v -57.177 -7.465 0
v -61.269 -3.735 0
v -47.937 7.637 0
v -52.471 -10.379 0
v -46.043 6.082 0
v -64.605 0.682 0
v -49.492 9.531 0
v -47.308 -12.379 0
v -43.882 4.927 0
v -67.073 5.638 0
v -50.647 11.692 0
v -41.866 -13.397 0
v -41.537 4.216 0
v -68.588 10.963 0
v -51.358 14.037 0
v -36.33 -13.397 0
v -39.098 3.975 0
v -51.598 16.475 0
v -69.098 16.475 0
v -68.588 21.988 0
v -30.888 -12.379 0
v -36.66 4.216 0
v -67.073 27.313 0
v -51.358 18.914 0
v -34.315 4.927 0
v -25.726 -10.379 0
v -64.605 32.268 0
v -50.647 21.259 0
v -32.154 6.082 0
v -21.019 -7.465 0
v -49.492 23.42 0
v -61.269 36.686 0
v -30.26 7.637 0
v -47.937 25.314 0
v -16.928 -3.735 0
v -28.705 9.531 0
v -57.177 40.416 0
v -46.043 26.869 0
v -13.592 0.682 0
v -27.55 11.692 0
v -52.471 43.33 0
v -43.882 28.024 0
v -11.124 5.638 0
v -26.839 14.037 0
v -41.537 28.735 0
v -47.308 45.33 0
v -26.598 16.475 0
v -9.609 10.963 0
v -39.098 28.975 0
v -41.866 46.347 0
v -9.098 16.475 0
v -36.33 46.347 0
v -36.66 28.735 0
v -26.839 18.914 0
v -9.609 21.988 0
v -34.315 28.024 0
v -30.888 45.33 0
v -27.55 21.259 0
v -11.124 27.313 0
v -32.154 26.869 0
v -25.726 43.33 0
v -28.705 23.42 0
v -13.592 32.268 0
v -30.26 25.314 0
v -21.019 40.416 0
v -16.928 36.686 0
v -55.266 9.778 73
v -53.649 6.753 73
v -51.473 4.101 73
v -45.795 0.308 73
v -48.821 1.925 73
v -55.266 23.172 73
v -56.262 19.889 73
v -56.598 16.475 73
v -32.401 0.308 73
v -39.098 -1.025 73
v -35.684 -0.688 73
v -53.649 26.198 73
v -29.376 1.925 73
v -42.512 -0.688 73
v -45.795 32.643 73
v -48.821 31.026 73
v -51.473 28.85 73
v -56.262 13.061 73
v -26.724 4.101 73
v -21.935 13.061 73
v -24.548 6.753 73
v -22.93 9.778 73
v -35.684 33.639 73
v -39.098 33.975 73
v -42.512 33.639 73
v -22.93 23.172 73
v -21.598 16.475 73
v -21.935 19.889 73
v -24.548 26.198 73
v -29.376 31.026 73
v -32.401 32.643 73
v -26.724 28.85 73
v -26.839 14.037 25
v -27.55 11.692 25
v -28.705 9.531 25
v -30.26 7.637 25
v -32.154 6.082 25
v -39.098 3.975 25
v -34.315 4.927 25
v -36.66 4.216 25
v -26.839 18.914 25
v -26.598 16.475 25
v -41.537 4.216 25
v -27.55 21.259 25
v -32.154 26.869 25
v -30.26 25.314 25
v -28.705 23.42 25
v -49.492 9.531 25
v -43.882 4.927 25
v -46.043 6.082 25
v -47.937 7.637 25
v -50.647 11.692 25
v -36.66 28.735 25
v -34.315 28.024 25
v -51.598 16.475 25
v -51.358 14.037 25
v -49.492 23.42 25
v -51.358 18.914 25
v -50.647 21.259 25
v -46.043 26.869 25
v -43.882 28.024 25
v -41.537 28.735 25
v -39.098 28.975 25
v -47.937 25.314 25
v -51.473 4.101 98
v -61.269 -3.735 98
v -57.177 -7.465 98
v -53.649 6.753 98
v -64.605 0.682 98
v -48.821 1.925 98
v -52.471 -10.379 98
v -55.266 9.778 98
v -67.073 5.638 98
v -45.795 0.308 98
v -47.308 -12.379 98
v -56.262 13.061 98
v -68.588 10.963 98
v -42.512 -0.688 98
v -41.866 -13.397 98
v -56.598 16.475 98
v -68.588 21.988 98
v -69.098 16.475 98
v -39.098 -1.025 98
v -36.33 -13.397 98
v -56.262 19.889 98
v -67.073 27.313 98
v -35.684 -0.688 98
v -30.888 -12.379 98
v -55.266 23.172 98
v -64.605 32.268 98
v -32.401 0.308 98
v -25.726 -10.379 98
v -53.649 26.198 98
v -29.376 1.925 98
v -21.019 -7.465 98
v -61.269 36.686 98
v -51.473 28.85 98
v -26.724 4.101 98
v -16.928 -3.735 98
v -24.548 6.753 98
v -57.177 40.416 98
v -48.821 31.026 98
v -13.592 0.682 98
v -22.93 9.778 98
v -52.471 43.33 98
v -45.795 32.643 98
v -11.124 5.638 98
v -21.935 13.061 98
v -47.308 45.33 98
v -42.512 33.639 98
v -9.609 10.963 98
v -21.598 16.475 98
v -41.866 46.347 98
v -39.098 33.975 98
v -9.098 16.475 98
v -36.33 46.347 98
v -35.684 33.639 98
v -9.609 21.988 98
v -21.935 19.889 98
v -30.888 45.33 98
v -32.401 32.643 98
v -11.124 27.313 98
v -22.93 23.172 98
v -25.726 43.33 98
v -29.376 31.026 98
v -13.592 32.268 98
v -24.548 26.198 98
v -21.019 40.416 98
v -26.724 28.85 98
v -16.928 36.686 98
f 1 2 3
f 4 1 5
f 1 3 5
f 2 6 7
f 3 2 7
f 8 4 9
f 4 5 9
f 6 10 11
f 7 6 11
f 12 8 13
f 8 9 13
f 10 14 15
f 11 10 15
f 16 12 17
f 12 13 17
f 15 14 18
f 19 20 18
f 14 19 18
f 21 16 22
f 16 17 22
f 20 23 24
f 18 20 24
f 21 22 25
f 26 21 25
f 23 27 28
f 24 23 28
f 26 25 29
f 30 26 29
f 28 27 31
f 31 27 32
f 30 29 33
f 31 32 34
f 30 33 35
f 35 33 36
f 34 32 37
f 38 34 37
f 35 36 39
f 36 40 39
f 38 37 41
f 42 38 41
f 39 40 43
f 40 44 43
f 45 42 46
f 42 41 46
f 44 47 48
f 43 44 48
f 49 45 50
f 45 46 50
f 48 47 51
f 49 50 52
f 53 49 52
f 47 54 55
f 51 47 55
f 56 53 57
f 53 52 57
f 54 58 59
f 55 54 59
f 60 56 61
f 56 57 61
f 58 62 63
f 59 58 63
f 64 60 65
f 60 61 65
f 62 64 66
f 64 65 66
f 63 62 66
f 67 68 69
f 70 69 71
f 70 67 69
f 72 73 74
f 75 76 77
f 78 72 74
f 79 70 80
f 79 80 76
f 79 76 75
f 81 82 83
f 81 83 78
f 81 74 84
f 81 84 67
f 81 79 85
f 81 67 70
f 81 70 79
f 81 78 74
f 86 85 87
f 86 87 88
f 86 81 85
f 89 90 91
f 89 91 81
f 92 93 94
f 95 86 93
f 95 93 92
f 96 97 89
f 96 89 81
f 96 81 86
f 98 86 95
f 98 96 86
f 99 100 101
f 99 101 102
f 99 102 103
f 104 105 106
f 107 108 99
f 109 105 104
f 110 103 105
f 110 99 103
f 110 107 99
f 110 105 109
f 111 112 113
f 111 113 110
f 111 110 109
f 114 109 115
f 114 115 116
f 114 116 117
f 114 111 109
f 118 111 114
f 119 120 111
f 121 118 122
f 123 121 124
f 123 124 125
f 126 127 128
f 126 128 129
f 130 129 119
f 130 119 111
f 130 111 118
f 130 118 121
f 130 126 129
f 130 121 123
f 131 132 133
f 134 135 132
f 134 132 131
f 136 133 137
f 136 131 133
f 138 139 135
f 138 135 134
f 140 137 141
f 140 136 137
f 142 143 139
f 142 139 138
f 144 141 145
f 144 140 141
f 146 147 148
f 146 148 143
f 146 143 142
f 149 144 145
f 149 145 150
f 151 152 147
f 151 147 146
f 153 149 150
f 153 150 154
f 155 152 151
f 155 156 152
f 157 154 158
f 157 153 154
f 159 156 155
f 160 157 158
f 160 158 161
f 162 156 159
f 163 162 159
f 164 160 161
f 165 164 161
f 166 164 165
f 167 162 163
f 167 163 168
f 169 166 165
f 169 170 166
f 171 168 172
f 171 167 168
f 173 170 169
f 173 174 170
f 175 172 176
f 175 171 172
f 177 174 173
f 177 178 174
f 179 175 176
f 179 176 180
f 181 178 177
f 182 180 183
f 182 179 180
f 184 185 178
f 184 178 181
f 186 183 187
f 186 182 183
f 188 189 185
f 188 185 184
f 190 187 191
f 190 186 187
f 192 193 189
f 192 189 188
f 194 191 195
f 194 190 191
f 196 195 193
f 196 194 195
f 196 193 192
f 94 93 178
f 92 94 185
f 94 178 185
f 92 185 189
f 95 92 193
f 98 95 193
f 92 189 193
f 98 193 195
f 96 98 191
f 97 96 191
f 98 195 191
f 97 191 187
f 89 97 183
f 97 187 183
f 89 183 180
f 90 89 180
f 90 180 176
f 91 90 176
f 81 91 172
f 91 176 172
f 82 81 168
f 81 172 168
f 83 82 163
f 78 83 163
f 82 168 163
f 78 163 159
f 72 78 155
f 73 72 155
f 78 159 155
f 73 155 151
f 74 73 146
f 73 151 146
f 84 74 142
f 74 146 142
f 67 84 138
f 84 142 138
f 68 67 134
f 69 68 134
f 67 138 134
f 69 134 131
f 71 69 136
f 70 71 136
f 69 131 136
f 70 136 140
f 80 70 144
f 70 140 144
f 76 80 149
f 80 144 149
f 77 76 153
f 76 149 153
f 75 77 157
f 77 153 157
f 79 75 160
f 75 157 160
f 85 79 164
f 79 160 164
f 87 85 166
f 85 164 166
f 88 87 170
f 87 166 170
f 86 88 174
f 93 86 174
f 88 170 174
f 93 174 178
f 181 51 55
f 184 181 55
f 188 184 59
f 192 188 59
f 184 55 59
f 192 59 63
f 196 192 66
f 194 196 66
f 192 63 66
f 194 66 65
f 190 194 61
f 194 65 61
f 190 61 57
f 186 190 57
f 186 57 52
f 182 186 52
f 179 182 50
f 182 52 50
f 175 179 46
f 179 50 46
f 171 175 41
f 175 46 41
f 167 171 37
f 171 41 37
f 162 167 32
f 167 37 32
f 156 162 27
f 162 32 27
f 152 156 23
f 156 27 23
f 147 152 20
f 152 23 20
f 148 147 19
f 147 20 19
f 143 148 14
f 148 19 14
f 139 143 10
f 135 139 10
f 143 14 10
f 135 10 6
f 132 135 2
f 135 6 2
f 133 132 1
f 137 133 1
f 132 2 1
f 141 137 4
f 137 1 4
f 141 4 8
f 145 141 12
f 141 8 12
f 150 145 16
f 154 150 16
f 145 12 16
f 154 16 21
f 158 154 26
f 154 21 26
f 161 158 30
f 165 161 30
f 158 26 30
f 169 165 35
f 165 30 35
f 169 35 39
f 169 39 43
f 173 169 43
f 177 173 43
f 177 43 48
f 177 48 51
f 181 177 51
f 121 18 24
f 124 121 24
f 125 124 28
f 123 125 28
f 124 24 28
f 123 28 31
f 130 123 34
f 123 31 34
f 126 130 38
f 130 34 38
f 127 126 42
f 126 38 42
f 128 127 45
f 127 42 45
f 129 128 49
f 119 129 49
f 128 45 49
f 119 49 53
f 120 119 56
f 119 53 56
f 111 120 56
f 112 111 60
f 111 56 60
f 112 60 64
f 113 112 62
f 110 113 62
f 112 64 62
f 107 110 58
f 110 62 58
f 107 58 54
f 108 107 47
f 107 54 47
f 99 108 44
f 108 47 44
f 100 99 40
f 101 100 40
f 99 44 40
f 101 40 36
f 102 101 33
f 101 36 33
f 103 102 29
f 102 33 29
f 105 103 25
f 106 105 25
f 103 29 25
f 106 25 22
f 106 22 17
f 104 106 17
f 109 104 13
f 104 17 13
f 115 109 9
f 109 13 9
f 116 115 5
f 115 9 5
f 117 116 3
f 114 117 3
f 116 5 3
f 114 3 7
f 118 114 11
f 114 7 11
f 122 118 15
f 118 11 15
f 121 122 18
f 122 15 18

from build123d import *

# Parameters (mm, degrees)
SKETCH_1_R          = 30
EXTRUDE_1_DEPTH     = 98
SKETCH_2_R          = 17.5
CUT_EXTRUDE_1_DEPTH = 25
SKETCH_3_R          = 12.5
CUT_EXTRUDE_2_DEPTH = 25


with BuildPart() as part:
    # 草图1 → 凸台-拉伸1 (new body)
    with BuildSketch(Plane.XY):
        with Locations((-39.098360656, 16.475409836)):
            Circle(SKETCH_1_R)
    extrude(amount=EXTRUDE_1_DEPTH)

    # 草图2 → 切除-拉伸1 (cut)
    with BuildSketch(Plane.XY.offset(98)):
        with Locations((-39.098360656, 16.475409836)):
            Circle(SKETCH_2_R)
    extrude(amount=-CUT_EXTRUDE_1_DEPTH, mode=Mode.SUBTRACT)

    # 草图3 → 切除-拉伸2 (cut)
    with BuildSketch(Plane(origin=(0, 0, 0), x_dir=(-1, 0, 0), z_dir=(0, 0, -1))):
        with Locations((39.098360656, 16.475409836)):
            Circle(SKETCH_3_R)
    extrude(amount=-CUT_EXTRUDE_2_DEPTH, mode=Mode.SUBTRACT)


solid = part.part
